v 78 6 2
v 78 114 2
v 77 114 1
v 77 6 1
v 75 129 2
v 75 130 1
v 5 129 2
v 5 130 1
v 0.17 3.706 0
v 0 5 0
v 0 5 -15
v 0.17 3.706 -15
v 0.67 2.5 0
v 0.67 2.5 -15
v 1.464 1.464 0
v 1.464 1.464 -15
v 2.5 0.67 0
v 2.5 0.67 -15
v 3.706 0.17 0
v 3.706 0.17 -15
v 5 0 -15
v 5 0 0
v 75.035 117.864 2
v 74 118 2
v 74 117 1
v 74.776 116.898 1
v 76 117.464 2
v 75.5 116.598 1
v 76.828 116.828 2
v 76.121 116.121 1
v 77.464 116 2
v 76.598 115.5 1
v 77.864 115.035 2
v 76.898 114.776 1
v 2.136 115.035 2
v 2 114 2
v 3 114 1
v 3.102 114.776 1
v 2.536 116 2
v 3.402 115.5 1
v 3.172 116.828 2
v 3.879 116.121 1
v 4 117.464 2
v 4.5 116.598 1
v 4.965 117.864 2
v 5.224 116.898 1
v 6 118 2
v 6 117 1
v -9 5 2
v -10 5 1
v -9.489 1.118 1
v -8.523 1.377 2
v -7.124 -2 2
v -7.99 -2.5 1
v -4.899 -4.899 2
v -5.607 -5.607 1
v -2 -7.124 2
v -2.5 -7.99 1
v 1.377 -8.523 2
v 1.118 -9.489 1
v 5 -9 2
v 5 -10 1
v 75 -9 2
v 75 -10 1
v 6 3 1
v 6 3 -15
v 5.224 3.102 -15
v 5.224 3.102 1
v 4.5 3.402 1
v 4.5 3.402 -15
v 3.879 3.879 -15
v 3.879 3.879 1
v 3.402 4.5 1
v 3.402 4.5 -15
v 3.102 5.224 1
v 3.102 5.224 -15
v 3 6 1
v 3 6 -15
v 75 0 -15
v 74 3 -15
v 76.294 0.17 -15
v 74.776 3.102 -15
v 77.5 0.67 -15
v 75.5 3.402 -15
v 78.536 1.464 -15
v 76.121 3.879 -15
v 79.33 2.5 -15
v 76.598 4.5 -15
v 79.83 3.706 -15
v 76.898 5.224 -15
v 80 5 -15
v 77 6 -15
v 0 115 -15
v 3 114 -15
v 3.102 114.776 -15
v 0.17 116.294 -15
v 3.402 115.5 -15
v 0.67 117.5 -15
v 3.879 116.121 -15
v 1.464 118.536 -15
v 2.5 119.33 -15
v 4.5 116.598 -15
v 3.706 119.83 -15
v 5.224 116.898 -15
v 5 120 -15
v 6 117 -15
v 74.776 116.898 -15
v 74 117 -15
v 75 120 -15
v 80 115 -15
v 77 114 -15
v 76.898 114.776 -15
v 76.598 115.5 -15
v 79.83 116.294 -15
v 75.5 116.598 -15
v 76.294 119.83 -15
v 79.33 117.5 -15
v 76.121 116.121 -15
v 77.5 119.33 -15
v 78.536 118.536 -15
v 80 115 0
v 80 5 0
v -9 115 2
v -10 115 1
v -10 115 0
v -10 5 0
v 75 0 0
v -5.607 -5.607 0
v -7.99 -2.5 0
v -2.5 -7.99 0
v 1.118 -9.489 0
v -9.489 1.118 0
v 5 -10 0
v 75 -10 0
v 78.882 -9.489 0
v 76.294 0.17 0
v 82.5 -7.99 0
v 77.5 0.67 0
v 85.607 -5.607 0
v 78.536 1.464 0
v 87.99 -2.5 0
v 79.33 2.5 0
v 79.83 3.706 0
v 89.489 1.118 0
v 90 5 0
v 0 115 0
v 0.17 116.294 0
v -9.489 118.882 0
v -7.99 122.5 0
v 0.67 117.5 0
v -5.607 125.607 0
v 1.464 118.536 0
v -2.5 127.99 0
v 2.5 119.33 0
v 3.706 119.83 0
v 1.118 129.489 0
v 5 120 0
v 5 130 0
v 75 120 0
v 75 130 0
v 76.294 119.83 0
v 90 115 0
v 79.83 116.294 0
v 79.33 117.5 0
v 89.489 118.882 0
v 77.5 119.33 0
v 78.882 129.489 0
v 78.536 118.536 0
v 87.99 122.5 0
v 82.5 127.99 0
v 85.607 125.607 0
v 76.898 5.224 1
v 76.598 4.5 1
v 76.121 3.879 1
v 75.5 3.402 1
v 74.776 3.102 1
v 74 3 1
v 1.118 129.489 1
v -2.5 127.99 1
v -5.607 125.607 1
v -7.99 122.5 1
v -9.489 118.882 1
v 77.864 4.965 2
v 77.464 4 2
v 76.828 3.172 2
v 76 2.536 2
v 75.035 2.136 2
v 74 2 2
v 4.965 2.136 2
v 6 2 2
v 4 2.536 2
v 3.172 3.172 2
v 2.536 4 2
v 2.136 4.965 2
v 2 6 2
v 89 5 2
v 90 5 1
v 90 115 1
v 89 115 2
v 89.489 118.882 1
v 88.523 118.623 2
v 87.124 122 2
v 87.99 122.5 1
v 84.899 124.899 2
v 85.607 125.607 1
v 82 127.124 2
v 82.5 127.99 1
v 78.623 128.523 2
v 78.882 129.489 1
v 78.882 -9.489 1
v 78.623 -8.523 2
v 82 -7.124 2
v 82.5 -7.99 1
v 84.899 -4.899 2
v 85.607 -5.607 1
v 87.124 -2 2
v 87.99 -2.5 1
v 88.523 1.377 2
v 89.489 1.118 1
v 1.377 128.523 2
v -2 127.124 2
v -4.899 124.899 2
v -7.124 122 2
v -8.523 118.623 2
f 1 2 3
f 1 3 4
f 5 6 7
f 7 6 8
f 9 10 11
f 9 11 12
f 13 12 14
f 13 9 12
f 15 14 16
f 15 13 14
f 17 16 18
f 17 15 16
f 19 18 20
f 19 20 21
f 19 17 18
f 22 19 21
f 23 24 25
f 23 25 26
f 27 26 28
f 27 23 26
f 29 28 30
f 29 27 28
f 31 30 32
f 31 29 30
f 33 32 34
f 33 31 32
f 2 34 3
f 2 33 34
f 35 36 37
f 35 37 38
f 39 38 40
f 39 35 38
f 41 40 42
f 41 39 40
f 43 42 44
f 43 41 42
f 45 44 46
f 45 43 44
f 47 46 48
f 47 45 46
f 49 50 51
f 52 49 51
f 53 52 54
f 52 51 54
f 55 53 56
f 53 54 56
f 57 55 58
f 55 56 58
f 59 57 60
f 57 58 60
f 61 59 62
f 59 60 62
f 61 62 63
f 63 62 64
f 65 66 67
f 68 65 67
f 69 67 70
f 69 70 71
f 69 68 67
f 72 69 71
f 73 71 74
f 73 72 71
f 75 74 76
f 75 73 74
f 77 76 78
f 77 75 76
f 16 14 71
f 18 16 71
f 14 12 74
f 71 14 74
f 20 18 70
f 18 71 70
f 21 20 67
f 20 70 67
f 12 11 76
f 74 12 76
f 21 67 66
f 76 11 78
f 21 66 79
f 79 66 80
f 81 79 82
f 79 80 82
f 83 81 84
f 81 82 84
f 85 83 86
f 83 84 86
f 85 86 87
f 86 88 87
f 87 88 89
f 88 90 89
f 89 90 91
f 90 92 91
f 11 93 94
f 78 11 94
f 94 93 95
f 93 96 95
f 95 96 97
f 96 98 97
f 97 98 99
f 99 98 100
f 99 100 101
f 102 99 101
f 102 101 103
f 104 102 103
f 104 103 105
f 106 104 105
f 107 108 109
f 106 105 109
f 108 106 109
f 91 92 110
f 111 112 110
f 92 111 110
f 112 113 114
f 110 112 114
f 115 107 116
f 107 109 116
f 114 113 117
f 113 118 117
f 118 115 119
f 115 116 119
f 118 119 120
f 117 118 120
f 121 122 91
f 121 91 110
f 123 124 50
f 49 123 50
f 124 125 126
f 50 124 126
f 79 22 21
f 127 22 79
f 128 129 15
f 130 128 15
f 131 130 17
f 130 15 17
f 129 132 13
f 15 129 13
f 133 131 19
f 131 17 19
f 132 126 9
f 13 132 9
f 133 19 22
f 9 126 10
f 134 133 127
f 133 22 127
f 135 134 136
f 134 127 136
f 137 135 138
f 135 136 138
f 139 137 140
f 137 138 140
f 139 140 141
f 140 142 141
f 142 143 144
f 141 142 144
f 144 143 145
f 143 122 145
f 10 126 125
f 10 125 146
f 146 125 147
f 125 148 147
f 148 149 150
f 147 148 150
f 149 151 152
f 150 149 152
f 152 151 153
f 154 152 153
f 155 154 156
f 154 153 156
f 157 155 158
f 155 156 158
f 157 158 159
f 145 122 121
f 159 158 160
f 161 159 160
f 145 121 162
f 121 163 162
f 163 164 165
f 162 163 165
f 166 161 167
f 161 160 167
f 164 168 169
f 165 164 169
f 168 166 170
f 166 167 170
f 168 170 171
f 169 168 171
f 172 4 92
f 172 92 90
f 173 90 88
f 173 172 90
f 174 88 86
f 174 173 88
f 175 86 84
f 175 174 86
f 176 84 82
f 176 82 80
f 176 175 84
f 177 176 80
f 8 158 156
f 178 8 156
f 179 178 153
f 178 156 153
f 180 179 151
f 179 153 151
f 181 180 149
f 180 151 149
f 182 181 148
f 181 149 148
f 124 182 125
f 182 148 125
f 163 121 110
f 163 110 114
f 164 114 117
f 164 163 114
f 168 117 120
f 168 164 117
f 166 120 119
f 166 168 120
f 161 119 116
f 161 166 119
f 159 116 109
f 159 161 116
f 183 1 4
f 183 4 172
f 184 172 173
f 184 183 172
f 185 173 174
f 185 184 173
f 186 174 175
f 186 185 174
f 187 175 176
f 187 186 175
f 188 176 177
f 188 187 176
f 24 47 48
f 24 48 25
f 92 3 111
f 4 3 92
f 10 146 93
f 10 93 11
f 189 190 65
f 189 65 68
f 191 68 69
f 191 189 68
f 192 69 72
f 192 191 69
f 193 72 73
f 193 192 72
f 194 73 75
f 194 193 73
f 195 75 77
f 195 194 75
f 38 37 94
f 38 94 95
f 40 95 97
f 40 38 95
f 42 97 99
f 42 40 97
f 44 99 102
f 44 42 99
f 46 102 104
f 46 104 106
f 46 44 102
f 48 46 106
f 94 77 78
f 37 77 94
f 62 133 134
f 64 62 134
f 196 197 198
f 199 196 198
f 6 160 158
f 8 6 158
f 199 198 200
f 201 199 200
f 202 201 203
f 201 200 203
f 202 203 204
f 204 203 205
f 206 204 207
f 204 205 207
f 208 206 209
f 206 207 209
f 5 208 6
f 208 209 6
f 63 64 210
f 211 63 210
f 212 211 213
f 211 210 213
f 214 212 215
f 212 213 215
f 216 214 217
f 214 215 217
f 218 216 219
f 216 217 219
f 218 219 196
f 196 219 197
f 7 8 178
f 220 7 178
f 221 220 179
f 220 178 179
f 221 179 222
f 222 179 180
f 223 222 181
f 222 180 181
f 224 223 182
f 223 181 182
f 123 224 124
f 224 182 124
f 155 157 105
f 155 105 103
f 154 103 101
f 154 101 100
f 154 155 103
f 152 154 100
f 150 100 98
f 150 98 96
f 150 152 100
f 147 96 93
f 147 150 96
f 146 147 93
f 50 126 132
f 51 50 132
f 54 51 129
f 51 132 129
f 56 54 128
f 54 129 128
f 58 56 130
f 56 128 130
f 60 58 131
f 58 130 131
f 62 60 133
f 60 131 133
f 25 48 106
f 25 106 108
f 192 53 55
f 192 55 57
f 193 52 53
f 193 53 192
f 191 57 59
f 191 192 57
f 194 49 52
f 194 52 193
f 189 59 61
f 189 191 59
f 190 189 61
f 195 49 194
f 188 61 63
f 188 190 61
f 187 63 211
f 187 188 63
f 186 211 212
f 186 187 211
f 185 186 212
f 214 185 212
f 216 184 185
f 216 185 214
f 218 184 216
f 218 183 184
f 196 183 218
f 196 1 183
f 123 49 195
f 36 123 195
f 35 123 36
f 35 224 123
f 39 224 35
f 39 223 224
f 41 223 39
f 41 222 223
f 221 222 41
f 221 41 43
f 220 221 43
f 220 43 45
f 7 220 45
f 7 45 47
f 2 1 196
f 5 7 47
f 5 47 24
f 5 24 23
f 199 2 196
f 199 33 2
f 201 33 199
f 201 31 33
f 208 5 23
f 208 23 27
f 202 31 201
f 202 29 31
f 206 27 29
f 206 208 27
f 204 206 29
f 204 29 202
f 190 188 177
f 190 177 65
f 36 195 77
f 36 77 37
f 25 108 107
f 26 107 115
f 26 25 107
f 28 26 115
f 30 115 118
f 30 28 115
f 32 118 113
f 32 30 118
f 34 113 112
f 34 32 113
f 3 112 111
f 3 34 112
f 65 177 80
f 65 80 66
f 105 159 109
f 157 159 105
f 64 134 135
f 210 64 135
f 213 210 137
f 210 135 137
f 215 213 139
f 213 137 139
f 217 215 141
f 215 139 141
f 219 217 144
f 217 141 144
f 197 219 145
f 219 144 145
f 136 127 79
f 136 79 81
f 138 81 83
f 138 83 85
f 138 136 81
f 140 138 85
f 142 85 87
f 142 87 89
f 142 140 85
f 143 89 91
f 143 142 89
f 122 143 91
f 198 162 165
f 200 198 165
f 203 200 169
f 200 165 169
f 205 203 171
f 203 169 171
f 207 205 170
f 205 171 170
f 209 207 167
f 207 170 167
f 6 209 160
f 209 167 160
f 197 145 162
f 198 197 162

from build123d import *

# Parameters (mm, degrees)
F1_DEPTH = 2
F2_DEPTH = 15
F3_SIZE  = 1


with BuildPart() as f1:
    # F0 (on Top) → F1 (new body)
    with BuildSketch(Plane.XY):
        with BuildLine():
            Line((5, -10), (75, -10))
            ThreePointArc((75, -10), (85.606602, -5.606602), (90, 5))
            Line((90, 5), (90, 115))
            ThreePointArc((90, 115), (85.606602, 125.606602), (75, 130))
            Line((75, 130), (5, 130))
            ThreePointArc((5, 130), (-5.606602, 125.606602), (-10, 115))
            Line((-10, 115), (-10, 5))
            ThreePointArc((-10, 5), (-5.606602, -5.606602), (5, -10))
        make_face()
        with BuildLine():
            Line((75, 0), (5, 0))
            ThreePointArc((5, 0), (1.464466, 1.464466), (0, 5))
            Line((0, 5), (0, 115))
            ThreePointArc((0, 115), (1.464466, 118.535534), (5, 120))
            Line((5, 120), (75, 120))
            ThreePointArc((75, 120), (78.535534, 118.535534), (80, 115))
            Line((80, 115), (80, 5))
            ThreePointArc((80, 5), (78.535534, 1.464466), (75, 0))
        make_face(mode=Mode.SUBTRACT)
        with BuildLine():
            ThreePointArc((0, 5), (1.464466, 1.464466), (5, 0))
            Line((5, 0), (75, 0))
            ThreePointArc((75, 0), (78.535534, 1.464466), (80, 5))
            Line((80, 5), (80, 115))
            ThreePointArc((80, 115), (78.535534, 118.535534), (75, 120))
            Line((75, 120), (5, 120))
            ThreePointArc((5, 120), (1.464466, 118.535534), (0, 115))
            Line((0, 115), (0, 5))
        make_face()
        with BuildLine():
            Line((77, 114), (77, 6))
            ThreePointArc((77, 6), (76.12132, 3.87868), (74, 3))
            Line((74, 3), (6, 3))
            ThreePointArc((6, 3), (3.87868, 3.87868), (3, 6))
            Line((3, 6), (3, 114))
            ThreePointArc((3, 114), (3.87868, 116.12132), (6, 117))
            Line((6, 117), (74, 117))
            ThreePointArc((74, 117), (76.12132, 116.12132), (77, 114))
        make_face(mode=Mode.SUBTRACT)
    extrude(amount=F1_DEPTH)

    # F0 (on Top) → F2 (join)
    with BuildSketch(Plane.XY):
        with BuildLine():
            ThreePointArc((0, 5), (1.464466, 1.464466), (5, 0))
            Line((5, 0), (75, 0))
            ThreePointArc((75, 0), (78.535534, 1.464466), (80, 5))
            Line((80, 5), (80, 115))
            ThreePointArc((80, 115), (78.535534, 118.535534), (75, 120))
            Line((75, 120), (5, 120))
            ThreePointArc((5, 120), (1.464466, 118.535534), (0, 115))
            Line((0, 115), (0, 5))
        make_face()
        with BuildLine():
            Line((77, 114), (77, 6))
            ThreePointArc((77, 6), (76.12132, 3.87868), (74, 3))
            Line((74, 3), (6, 3))
            ThreePointArc((6, 3), (3.87868, 3.87868), (3, 6))
            Line((3, 6), (3, 114))
            ThreePointArc((3, 114), (3.87868, 116.12132), (6, 117))
            Line((6, 117), (74, 117))
            ThreePointArc((74, 117), (76.12132, 116.12132), (77, 114))
        make_face(mode=Mode.SUBTRACT)
    extrude(amount=-F2_DEPTH)

    # F3
    f3_edges = [f1.edges().sort_by_distance(p)[0] for p in [
        (77, 60, 2),
        (76.12132, 116.12132, 2),
        (40, 117, 2),
        (3.87868, 116.12132, 2),
        (3, 60, 2),
        (40, 3, 2),
        (76.12132, 3.87868, 2),
        (3.87868, 3.87868, 2),
        (-5.606602, -5.606602, 2),
        (40, -10, 2),
        (85.606602, -5.606602, 2),
        (90, 60, 2),
        (-10, 60, 2),
        (40, 130, 2),
        (-5.606602, 125.606602, 2),
        (85.606602, 125.606602, 2),
    ]]
    chamfer(f3_edges, length=F3_SIZE)


solid = f1.part
